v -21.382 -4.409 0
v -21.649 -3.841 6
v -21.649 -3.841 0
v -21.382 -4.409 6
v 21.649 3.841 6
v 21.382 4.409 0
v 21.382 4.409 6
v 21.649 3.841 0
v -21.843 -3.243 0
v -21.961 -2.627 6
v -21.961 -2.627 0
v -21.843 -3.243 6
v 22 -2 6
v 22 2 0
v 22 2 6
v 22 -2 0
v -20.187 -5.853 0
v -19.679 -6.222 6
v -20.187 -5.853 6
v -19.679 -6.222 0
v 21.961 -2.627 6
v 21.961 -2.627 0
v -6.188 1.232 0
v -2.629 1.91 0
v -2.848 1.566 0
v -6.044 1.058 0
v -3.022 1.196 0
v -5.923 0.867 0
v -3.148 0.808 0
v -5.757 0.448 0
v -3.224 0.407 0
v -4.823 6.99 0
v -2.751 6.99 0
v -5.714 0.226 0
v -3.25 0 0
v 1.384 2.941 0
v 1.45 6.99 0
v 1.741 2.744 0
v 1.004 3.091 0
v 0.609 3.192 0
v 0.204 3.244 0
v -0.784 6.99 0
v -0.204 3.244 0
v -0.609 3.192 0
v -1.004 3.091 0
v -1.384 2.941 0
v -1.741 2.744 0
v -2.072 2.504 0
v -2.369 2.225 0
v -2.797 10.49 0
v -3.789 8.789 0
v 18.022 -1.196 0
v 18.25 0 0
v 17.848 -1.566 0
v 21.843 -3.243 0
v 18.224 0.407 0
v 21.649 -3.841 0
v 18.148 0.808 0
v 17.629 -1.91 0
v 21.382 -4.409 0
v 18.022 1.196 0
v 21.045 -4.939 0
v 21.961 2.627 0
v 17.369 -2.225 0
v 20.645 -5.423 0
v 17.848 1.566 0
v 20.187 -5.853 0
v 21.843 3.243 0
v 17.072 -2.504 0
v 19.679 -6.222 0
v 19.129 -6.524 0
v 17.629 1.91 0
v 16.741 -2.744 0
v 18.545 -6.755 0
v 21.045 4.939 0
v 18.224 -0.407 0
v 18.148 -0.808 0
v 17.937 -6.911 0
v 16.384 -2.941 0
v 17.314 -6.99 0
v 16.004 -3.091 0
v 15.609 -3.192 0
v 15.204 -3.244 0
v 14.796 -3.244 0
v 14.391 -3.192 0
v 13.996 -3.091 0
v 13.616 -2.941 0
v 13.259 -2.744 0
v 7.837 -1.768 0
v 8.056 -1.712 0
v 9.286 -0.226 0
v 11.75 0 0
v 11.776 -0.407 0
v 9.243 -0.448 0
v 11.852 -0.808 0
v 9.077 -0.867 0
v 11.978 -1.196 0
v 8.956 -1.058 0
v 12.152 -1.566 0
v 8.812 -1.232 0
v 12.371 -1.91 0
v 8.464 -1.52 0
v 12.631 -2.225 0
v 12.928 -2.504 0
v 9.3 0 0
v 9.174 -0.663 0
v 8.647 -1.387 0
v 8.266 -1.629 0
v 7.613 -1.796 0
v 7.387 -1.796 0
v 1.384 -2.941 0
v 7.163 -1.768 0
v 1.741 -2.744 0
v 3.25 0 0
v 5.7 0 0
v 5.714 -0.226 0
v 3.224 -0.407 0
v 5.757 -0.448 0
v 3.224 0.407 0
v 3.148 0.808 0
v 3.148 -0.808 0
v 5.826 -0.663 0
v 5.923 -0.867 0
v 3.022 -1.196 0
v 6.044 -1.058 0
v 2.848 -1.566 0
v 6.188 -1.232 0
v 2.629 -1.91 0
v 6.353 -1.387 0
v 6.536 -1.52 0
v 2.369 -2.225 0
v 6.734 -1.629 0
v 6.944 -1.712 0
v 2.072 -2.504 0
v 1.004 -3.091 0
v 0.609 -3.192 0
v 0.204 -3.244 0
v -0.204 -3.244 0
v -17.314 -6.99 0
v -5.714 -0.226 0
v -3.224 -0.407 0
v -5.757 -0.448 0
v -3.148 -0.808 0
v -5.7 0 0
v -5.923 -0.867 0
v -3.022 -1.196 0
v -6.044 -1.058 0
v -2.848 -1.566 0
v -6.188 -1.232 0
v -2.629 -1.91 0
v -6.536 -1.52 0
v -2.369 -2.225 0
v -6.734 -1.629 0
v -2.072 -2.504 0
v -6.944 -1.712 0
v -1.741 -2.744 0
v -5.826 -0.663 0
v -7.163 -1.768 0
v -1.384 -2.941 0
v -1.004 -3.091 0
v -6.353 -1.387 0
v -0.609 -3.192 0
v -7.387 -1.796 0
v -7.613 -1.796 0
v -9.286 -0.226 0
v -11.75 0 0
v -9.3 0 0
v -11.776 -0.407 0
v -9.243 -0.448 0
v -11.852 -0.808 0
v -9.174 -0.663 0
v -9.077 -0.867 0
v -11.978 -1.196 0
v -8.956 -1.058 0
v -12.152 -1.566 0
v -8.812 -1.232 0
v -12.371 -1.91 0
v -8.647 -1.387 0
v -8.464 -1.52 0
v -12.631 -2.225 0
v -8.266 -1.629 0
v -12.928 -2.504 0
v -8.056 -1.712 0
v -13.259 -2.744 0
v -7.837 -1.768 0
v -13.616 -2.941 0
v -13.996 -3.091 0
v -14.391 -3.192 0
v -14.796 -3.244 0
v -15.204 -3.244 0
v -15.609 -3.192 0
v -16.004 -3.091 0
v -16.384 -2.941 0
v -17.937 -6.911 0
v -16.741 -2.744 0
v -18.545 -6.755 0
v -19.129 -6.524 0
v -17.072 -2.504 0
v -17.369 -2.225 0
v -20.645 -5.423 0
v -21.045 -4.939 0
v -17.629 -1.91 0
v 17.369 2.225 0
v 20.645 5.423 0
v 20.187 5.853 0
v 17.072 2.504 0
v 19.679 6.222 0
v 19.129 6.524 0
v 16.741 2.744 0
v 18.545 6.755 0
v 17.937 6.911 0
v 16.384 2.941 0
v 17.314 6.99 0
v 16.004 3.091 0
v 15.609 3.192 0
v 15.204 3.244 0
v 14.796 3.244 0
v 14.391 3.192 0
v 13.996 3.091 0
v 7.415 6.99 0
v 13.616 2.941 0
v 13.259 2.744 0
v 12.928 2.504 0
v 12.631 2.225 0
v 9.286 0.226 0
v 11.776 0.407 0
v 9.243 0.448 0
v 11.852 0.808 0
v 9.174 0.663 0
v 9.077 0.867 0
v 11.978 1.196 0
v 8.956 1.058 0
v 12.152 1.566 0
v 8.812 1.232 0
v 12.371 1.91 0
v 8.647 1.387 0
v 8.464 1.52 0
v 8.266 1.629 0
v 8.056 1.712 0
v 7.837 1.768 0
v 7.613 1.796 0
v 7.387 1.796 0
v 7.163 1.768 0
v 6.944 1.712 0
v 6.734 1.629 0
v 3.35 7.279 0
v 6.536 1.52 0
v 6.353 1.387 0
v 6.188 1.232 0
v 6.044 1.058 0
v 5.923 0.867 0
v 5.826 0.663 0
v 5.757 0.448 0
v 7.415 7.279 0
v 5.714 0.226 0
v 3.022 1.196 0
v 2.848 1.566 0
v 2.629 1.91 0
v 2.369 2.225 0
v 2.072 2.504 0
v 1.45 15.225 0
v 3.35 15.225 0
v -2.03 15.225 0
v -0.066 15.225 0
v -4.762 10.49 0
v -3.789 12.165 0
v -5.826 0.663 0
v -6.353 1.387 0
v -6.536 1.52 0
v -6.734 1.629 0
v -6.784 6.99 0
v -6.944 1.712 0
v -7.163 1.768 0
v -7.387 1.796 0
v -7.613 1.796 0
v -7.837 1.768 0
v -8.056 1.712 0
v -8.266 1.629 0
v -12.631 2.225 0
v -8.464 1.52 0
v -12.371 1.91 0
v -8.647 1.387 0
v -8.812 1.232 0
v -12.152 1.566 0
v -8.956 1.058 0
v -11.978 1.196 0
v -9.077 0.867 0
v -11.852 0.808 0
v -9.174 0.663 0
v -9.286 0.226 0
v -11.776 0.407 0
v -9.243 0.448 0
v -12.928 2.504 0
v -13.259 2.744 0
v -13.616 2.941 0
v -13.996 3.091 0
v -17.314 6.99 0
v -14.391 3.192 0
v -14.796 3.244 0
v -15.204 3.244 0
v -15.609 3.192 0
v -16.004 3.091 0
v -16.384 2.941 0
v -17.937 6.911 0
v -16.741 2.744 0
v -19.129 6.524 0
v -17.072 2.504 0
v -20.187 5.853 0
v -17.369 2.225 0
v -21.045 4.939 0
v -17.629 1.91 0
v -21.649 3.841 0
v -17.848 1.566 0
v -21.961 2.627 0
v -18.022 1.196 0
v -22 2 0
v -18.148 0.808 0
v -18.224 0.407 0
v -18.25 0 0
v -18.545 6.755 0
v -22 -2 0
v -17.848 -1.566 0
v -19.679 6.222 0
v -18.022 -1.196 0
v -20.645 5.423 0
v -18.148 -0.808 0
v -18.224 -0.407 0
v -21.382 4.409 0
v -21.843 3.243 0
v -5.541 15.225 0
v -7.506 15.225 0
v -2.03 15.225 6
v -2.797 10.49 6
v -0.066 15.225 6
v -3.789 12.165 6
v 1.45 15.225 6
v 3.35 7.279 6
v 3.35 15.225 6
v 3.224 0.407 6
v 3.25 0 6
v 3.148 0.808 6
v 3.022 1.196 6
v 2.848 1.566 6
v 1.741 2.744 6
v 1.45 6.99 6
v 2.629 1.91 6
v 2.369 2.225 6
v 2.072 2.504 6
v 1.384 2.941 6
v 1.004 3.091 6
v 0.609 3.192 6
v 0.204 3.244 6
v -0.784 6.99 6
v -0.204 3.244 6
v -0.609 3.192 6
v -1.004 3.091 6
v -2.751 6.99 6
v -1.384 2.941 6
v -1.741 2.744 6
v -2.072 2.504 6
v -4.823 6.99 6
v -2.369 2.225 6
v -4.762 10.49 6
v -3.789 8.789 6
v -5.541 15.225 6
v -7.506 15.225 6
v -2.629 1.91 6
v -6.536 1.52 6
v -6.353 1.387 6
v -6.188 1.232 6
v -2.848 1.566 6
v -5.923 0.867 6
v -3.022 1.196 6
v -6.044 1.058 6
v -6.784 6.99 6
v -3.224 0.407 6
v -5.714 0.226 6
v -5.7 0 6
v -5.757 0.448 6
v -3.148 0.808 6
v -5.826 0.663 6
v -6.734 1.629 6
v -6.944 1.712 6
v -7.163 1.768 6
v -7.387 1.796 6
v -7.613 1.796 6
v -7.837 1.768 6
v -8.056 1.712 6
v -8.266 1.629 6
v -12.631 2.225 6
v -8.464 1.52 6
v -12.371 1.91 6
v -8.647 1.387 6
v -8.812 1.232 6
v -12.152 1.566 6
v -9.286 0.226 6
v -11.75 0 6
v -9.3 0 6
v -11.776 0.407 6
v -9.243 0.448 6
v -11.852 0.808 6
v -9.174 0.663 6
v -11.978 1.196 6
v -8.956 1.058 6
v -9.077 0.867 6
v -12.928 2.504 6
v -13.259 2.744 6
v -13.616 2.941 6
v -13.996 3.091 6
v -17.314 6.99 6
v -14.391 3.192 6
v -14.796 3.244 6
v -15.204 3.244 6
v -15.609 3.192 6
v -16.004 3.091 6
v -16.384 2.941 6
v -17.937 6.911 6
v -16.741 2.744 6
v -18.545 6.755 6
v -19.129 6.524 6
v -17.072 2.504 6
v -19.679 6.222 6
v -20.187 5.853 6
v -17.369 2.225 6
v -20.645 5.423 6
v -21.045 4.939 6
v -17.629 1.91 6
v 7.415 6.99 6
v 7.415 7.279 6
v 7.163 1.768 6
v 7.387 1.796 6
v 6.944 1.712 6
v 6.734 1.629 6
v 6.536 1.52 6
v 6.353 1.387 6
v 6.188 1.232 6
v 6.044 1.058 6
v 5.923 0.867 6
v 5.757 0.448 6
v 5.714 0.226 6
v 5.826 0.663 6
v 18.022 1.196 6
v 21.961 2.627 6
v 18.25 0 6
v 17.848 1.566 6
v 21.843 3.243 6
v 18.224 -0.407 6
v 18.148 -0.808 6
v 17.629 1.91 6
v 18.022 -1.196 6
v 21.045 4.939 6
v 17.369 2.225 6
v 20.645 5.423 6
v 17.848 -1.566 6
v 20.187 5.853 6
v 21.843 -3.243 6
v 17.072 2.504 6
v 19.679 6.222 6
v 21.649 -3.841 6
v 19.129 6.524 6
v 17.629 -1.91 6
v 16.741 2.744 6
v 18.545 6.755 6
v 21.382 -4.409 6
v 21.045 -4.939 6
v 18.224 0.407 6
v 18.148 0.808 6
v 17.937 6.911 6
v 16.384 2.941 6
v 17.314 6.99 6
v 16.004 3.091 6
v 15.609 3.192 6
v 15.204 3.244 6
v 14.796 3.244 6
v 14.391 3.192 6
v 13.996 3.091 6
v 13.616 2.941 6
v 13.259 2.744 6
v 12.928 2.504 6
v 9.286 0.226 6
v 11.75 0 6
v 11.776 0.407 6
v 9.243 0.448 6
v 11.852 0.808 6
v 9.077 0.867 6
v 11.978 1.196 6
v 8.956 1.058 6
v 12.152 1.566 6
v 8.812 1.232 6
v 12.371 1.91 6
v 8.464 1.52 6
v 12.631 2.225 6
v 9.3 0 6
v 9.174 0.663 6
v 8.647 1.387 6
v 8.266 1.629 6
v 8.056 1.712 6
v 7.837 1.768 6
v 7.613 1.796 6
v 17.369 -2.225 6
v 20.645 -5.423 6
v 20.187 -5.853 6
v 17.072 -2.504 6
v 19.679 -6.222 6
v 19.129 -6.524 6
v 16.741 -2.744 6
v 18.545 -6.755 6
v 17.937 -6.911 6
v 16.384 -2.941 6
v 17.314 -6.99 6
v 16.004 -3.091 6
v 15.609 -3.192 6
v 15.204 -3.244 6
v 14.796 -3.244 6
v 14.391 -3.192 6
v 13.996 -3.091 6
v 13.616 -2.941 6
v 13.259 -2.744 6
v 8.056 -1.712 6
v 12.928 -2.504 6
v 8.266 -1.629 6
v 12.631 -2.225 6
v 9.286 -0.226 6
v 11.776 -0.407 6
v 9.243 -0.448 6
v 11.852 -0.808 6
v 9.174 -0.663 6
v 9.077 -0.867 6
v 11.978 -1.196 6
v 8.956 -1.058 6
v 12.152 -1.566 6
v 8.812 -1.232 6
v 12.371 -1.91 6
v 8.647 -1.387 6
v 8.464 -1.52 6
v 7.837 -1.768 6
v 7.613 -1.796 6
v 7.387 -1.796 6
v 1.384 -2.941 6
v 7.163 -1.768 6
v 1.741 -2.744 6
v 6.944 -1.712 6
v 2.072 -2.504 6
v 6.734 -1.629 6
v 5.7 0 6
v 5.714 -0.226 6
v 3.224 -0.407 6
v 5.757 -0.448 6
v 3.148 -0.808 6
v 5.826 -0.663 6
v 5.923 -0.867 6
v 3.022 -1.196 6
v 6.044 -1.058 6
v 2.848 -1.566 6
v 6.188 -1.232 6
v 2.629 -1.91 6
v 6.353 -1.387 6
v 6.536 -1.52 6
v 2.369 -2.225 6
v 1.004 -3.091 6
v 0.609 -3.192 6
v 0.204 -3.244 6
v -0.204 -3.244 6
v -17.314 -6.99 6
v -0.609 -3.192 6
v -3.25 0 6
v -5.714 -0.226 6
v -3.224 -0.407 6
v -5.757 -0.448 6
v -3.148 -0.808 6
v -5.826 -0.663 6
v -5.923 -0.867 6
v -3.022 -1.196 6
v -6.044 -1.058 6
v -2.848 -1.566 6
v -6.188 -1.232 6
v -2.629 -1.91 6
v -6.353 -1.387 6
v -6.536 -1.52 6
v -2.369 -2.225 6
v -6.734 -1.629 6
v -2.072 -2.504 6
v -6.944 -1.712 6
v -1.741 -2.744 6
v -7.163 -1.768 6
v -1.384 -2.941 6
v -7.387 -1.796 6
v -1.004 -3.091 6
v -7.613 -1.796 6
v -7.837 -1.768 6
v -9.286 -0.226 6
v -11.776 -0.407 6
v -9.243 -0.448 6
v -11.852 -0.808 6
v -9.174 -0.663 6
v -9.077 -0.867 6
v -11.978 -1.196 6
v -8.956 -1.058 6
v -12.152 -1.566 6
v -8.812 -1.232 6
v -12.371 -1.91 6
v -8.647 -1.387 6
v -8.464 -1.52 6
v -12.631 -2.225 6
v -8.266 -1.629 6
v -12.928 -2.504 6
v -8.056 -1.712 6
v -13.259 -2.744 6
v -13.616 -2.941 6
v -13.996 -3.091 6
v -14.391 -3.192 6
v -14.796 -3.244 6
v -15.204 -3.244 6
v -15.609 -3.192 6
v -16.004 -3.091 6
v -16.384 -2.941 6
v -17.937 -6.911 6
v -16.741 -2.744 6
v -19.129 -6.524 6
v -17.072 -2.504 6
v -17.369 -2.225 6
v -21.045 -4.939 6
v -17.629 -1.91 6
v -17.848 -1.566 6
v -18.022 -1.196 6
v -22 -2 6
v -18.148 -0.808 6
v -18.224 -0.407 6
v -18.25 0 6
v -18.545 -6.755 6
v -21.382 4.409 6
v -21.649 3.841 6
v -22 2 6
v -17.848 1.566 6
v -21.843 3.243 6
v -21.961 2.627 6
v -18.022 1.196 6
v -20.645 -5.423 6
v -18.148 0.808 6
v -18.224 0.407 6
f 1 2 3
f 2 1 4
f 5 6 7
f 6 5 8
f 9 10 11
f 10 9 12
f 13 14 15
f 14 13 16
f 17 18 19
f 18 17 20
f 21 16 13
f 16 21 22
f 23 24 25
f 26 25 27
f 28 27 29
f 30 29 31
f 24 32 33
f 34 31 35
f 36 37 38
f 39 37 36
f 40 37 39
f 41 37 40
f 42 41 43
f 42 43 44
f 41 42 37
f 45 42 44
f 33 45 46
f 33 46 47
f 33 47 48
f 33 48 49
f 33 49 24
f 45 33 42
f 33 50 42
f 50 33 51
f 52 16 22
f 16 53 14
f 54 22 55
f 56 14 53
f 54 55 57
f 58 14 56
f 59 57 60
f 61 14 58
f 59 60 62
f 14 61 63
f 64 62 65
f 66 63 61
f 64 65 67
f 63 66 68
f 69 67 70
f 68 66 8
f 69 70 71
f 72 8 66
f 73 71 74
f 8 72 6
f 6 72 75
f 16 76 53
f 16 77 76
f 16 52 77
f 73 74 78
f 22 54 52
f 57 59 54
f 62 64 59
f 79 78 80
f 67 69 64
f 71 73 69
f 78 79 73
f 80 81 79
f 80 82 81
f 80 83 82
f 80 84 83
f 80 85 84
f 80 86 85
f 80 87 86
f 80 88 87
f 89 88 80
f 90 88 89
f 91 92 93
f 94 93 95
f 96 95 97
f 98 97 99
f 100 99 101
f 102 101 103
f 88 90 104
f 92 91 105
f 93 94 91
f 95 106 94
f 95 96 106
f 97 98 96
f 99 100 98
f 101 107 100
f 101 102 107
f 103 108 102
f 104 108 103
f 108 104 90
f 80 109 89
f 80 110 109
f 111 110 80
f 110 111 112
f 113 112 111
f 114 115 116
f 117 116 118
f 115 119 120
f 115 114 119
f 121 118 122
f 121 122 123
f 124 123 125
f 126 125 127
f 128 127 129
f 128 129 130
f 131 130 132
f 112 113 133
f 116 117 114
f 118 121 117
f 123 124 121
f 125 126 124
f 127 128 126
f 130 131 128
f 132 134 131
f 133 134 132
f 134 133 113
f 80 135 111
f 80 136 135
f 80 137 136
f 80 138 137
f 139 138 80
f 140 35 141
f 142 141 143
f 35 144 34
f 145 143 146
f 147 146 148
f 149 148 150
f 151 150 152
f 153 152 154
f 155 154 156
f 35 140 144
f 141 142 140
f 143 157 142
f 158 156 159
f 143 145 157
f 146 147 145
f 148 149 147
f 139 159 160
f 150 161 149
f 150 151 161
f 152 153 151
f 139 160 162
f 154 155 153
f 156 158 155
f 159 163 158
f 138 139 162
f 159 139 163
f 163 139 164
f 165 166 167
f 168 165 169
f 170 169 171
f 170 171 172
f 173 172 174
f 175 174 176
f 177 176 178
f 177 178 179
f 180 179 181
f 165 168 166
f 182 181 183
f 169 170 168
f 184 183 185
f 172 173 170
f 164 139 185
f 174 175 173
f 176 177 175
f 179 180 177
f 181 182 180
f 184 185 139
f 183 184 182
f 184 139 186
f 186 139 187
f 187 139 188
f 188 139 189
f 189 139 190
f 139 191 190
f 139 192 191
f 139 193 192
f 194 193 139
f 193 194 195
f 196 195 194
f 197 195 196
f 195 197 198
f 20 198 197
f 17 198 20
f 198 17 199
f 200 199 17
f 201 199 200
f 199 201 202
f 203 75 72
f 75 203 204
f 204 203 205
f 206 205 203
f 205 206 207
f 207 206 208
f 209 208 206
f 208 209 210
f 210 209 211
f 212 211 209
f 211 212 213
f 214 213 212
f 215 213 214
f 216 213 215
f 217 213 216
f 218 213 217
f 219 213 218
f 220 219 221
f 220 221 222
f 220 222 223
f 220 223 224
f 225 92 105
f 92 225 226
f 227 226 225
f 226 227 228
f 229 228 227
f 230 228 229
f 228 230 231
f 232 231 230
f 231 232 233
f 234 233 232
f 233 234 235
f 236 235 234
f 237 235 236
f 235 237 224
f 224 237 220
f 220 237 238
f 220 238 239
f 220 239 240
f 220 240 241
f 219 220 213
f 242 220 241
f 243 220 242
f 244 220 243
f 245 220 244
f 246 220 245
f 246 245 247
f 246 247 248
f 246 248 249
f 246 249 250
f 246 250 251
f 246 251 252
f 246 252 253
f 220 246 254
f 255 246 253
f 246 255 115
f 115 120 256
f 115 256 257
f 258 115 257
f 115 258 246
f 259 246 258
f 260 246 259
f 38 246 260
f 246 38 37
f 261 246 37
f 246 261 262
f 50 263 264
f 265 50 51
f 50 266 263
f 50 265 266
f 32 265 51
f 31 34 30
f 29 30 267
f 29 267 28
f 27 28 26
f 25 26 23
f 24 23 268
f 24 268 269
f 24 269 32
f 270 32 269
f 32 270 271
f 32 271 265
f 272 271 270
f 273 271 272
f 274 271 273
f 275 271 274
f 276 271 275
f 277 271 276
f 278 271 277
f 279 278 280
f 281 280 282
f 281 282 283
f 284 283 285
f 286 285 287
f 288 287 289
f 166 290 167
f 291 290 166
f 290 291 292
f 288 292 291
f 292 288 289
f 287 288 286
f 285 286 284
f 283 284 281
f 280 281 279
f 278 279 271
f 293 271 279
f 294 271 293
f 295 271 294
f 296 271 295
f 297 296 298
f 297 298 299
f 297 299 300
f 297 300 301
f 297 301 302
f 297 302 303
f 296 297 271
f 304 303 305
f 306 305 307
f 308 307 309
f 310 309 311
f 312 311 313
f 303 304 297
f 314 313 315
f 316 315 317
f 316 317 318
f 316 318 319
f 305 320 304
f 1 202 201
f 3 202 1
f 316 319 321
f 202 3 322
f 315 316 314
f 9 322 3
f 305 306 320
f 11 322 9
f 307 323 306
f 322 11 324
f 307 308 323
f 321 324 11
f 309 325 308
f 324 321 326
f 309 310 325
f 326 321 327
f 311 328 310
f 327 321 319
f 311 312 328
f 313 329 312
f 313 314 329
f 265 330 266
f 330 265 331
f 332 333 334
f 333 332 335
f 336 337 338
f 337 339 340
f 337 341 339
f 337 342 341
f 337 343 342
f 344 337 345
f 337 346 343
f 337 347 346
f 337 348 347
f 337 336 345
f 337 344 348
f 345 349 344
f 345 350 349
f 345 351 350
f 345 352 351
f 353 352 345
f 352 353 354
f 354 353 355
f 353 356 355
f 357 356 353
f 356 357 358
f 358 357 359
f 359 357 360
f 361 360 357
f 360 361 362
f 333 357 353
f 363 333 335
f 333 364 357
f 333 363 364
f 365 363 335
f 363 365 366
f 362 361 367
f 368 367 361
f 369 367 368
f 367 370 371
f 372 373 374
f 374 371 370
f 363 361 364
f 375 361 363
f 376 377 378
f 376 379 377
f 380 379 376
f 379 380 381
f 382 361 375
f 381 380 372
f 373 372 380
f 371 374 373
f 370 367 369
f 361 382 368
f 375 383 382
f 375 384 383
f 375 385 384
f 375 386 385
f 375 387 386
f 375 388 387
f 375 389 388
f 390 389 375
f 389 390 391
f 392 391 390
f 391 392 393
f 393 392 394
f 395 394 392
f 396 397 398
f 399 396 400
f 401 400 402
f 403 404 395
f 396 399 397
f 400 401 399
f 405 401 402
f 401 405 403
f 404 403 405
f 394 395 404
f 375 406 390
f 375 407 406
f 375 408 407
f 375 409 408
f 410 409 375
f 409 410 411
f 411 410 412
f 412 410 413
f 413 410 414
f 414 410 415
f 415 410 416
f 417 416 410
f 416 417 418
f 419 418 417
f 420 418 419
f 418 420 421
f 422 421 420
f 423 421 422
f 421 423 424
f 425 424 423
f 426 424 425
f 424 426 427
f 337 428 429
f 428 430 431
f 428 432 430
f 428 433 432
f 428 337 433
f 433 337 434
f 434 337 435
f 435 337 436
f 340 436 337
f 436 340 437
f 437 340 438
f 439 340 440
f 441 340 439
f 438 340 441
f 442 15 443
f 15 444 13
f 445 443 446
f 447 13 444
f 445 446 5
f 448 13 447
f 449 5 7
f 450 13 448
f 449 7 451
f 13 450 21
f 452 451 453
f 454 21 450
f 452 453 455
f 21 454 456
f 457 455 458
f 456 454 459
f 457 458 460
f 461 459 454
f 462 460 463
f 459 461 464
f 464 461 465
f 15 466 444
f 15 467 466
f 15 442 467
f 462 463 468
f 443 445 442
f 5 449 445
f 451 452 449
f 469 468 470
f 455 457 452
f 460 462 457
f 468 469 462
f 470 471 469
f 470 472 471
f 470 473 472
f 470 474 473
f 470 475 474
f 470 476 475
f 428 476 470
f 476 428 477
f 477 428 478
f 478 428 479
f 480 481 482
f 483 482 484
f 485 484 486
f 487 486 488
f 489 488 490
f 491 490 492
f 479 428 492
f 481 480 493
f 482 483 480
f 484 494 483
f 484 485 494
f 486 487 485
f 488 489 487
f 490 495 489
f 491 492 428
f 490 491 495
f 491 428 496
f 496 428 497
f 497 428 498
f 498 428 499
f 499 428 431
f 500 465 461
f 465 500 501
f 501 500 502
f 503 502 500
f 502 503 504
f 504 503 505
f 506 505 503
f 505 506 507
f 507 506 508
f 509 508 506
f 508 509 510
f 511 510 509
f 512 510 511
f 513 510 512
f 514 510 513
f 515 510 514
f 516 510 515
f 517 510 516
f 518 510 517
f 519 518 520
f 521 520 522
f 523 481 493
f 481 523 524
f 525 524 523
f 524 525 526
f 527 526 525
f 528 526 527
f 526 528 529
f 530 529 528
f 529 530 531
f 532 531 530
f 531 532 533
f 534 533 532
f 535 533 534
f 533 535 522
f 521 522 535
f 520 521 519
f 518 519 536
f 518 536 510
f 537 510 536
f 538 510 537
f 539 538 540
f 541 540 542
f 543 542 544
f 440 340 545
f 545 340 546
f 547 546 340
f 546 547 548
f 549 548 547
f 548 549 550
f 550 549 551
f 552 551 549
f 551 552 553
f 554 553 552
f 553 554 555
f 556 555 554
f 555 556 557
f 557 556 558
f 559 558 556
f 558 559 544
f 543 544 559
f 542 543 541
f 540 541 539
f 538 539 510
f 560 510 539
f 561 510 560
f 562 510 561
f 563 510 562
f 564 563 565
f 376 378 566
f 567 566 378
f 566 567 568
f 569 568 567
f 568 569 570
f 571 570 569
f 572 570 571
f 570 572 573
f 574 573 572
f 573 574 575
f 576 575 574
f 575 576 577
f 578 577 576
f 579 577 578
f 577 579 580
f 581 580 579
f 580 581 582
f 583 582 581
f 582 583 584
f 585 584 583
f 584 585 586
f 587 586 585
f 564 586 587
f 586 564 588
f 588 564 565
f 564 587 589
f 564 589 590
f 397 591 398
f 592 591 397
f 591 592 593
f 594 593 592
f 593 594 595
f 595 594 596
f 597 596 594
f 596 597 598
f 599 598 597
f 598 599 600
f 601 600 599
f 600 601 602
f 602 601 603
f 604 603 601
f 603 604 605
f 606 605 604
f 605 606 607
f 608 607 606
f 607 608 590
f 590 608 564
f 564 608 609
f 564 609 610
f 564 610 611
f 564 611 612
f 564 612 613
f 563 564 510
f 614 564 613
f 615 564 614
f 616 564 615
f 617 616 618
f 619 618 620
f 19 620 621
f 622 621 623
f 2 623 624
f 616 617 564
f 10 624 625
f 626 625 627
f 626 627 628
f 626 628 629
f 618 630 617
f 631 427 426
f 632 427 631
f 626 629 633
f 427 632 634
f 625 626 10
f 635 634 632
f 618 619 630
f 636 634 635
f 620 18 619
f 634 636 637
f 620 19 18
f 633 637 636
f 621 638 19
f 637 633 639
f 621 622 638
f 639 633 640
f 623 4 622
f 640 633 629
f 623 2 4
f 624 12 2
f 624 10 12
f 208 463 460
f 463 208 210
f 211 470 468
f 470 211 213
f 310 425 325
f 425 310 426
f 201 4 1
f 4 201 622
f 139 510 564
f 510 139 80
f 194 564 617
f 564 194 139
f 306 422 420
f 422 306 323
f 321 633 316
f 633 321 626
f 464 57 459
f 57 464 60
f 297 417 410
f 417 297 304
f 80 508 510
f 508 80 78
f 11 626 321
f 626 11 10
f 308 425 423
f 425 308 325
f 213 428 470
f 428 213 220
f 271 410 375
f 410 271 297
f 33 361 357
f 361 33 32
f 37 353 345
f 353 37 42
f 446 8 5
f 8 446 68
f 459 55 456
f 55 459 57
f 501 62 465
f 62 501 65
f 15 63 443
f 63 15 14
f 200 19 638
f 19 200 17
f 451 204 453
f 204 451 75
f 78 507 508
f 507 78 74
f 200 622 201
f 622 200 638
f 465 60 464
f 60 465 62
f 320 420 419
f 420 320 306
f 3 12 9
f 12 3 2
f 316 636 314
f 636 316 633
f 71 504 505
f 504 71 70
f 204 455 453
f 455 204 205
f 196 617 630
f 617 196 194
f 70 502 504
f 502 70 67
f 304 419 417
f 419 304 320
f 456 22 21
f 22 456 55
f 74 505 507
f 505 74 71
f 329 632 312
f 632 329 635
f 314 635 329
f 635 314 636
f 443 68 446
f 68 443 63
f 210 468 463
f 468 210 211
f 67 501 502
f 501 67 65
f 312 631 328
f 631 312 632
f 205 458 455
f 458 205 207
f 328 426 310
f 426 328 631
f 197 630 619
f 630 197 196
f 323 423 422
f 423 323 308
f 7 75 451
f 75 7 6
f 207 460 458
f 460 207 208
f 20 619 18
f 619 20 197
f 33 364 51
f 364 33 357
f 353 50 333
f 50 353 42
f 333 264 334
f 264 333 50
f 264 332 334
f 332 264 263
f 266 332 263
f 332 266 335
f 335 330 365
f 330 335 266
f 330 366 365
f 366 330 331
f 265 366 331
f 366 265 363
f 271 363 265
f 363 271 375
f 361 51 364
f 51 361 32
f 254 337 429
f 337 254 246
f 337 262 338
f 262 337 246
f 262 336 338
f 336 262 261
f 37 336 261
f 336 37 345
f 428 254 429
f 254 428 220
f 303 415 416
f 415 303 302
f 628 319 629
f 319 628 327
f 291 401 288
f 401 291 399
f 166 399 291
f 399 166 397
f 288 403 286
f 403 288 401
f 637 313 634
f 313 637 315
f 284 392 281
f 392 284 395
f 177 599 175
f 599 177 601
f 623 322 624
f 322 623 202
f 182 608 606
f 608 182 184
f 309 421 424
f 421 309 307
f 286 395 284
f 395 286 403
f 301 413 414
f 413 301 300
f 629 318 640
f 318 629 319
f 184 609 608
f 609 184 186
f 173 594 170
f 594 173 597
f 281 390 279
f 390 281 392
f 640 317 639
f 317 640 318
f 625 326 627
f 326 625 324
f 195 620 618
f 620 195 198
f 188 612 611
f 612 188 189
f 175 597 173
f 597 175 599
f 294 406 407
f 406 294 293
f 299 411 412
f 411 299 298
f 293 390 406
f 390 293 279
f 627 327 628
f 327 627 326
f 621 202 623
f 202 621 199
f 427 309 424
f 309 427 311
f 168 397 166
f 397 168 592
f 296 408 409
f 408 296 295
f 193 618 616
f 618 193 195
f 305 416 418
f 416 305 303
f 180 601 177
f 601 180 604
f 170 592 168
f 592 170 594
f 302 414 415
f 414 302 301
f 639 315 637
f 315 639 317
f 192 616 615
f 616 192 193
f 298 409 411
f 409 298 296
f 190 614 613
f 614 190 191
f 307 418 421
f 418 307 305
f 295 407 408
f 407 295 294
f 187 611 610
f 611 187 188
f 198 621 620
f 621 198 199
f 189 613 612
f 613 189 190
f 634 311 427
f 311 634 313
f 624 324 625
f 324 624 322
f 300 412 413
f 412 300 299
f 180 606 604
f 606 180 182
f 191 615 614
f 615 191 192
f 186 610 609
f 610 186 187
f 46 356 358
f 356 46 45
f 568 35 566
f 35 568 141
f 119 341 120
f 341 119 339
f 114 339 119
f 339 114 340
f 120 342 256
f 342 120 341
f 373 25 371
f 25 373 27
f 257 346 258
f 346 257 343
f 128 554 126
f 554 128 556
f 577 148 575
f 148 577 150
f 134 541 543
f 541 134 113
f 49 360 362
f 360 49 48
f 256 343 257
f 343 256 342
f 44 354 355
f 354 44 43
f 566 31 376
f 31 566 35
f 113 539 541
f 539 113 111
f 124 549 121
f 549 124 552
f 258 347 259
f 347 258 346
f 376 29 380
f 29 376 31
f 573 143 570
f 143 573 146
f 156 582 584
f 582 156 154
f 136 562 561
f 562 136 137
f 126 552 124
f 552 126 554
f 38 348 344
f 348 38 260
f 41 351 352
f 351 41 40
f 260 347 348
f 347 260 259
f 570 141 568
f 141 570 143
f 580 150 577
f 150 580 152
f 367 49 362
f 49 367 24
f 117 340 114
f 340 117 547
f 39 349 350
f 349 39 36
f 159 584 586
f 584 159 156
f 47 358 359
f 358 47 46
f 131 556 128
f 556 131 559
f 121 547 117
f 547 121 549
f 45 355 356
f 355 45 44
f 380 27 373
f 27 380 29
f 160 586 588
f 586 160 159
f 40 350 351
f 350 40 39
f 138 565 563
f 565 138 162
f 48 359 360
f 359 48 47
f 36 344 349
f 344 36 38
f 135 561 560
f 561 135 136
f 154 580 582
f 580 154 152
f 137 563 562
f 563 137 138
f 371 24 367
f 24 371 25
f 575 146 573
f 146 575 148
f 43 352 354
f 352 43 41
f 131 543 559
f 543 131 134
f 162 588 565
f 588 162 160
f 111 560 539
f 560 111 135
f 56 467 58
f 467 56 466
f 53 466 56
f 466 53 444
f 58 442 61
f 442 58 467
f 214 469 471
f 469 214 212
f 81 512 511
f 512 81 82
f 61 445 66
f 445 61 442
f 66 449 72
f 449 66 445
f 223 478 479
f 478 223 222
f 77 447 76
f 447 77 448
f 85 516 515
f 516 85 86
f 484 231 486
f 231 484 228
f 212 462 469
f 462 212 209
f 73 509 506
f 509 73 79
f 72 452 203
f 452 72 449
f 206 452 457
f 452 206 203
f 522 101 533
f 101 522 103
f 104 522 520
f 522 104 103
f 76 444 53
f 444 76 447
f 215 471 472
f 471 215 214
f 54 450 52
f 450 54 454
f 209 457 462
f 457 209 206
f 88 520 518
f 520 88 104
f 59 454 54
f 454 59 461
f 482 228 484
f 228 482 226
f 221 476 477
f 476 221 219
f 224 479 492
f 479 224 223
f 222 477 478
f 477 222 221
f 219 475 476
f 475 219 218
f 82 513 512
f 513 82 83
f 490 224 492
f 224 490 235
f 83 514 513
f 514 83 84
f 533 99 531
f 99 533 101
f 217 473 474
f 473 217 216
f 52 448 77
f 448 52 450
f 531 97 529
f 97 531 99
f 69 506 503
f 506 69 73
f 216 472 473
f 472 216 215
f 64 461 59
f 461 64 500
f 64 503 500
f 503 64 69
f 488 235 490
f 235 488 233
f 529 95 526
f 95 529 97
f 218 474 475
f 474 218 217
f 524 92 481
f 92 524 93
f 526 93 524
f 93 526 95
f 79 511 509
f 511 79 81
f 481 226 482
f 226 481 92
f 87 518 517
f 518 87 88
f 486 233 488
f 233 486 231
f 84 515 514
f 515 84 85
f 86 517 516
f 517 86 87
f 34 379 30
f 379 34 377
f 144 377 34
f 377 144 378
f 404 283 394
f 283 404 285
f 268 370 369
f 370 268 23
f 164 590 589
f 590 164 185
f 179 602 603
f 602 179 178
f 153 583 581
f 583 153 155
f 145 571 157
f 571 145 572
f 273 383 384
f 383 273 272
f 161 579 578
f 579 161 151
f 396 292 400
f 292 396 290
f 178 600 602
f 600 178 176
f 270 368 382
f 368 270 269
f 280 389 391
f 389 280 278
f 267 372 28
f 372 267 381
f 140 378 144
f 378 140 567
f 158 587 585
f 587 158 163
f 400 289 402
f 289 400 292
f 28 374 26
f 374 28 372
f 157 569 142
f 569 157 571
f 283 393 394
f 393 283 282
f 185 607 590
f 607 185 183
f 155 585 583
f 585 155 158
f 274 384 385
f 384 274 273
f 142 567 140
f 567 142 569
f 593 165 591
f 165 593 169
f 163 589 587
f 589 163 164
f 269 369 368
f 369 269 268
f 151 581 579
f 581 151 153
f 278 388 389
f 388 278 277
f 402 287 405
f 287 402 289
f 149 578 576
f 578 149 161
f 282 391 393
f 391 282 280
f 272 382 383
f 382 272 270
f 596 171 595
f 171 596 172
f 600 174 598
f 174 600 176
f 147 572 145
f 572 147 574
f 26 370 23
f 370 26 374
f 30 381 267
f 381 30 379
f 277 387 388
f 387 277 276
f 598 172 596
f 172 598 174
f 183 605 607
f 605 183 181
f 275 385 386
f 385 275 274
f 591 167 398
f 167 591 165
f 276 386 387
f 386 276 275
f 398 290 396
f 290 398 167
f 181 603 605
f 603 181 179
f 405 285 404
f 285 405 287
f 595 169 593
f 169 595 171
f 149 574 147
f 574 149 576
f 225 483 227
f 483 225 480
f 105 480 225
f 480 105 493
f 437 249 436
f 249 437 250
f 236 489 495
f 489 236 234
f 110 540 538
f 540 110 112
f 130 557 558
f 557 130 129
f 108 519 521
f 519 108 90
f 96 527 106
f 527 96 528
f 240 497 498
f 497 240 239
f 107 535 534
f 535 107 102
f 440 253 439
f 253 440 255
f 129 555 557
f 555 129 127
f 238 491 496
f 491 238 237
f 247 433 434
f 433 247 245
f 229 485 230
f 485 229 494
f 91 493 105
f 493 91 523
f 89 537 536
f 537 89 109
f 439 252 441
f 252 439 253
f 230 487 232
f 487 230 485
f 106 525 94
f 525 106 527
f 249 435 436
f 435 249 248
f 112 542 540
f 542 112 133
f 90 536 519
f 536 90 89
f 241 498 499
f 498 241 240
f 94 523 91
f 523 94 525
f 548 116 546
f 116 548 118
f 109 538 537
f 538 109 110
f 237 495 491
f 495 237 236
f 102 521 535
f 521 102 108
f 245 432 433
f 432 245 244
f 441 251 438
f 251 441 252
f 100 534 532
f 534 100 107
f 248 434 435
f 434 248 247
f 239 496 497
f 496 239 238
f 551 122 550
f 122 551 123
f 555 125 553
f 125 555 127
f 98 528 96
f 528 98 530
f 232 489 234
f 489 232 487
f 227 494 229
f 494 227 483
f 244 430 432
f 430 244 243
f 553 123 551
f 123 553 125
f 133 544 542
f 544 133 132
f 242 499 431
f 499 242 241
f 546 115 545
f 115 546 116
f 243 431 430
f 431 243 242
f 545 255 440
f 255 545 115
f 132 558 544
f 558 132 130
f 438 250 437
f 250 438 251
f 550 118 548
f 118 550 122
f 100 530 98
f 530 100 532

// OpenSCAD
$fn = 50;


difference() {
	union() {
		hull() {
			translate(v = [-17.0000000000, 2.0000000000, 0]) {
				cylinder(h = 6, r = 5);
			}
			translate(v = [17.0000000000, 2.0000000000, 0]) {
				cylinder(h = 6, r = 5);
			}
			translate(v = [-17.0000000000, -2.0000000000, 0]) {
				cylinder(h = 6, r = 5);
			}
			translate(v = [17.0000000000, -2.0000000000, 0]) {
				cylinder(h = 6, r = 5);
			}
		}
		translate(v = [0, 15.0000000000, 0]) {
			linear_extrude(height = 6) {
				text(font = "DejaVu Sans Mono:style=Bold", halign = "center", size = 9.5000000000, text = "XL", valign = "top");
			}
		}
	}
	union() {
		translate(v = [-15.0000000000, 0.0000000000, 0]) {
			translate(v = [0, 0, -100]) {
				cylinder(h = 200, r = 3.2500000000);
			}
		}
		translate(v = [0, 0, -100]) {
			cylinder(h = 200, r = 3.2500000000);
		}
		translate(v = [15.0000000000, 0.0000000000, 0]) {
			translate(v = [0, 0, -100]) {
				cylinder(h = 200, r = 3.2500000000);
			}
		}
		translate(v = [-15.0000000000, 0.0000000000, 0]) {
			translate(v = [0, 0, -100]) {
				cylinder(h = 200, r = 1.8000000000);
			}
		}
		translate(v = [-7.5000000000, 0.0000000000, 0]) {
			translate(v = [0, 0, -100]) {
				cylinder(h = 200, r = 1.8000000000);
			}
		}
		translate(v = [0, 0, -100]) {
			cylinder(h = 200, r = 1.8000000000);
		}
		translate(v = [7.5000000000, 0.0000000000, 0]) {
			translate(v = [0, 0, -100]) {
				cylinder(h = 200, r = 1.8000000000);
			}
		}
		translate(v = [15.0000000000, 0.0000000000, 0]) {
			translate(v = [0, 0, -100]) {
				cylinder(h = 200, r = 1.8000000000);
			}
		}
	}
}
